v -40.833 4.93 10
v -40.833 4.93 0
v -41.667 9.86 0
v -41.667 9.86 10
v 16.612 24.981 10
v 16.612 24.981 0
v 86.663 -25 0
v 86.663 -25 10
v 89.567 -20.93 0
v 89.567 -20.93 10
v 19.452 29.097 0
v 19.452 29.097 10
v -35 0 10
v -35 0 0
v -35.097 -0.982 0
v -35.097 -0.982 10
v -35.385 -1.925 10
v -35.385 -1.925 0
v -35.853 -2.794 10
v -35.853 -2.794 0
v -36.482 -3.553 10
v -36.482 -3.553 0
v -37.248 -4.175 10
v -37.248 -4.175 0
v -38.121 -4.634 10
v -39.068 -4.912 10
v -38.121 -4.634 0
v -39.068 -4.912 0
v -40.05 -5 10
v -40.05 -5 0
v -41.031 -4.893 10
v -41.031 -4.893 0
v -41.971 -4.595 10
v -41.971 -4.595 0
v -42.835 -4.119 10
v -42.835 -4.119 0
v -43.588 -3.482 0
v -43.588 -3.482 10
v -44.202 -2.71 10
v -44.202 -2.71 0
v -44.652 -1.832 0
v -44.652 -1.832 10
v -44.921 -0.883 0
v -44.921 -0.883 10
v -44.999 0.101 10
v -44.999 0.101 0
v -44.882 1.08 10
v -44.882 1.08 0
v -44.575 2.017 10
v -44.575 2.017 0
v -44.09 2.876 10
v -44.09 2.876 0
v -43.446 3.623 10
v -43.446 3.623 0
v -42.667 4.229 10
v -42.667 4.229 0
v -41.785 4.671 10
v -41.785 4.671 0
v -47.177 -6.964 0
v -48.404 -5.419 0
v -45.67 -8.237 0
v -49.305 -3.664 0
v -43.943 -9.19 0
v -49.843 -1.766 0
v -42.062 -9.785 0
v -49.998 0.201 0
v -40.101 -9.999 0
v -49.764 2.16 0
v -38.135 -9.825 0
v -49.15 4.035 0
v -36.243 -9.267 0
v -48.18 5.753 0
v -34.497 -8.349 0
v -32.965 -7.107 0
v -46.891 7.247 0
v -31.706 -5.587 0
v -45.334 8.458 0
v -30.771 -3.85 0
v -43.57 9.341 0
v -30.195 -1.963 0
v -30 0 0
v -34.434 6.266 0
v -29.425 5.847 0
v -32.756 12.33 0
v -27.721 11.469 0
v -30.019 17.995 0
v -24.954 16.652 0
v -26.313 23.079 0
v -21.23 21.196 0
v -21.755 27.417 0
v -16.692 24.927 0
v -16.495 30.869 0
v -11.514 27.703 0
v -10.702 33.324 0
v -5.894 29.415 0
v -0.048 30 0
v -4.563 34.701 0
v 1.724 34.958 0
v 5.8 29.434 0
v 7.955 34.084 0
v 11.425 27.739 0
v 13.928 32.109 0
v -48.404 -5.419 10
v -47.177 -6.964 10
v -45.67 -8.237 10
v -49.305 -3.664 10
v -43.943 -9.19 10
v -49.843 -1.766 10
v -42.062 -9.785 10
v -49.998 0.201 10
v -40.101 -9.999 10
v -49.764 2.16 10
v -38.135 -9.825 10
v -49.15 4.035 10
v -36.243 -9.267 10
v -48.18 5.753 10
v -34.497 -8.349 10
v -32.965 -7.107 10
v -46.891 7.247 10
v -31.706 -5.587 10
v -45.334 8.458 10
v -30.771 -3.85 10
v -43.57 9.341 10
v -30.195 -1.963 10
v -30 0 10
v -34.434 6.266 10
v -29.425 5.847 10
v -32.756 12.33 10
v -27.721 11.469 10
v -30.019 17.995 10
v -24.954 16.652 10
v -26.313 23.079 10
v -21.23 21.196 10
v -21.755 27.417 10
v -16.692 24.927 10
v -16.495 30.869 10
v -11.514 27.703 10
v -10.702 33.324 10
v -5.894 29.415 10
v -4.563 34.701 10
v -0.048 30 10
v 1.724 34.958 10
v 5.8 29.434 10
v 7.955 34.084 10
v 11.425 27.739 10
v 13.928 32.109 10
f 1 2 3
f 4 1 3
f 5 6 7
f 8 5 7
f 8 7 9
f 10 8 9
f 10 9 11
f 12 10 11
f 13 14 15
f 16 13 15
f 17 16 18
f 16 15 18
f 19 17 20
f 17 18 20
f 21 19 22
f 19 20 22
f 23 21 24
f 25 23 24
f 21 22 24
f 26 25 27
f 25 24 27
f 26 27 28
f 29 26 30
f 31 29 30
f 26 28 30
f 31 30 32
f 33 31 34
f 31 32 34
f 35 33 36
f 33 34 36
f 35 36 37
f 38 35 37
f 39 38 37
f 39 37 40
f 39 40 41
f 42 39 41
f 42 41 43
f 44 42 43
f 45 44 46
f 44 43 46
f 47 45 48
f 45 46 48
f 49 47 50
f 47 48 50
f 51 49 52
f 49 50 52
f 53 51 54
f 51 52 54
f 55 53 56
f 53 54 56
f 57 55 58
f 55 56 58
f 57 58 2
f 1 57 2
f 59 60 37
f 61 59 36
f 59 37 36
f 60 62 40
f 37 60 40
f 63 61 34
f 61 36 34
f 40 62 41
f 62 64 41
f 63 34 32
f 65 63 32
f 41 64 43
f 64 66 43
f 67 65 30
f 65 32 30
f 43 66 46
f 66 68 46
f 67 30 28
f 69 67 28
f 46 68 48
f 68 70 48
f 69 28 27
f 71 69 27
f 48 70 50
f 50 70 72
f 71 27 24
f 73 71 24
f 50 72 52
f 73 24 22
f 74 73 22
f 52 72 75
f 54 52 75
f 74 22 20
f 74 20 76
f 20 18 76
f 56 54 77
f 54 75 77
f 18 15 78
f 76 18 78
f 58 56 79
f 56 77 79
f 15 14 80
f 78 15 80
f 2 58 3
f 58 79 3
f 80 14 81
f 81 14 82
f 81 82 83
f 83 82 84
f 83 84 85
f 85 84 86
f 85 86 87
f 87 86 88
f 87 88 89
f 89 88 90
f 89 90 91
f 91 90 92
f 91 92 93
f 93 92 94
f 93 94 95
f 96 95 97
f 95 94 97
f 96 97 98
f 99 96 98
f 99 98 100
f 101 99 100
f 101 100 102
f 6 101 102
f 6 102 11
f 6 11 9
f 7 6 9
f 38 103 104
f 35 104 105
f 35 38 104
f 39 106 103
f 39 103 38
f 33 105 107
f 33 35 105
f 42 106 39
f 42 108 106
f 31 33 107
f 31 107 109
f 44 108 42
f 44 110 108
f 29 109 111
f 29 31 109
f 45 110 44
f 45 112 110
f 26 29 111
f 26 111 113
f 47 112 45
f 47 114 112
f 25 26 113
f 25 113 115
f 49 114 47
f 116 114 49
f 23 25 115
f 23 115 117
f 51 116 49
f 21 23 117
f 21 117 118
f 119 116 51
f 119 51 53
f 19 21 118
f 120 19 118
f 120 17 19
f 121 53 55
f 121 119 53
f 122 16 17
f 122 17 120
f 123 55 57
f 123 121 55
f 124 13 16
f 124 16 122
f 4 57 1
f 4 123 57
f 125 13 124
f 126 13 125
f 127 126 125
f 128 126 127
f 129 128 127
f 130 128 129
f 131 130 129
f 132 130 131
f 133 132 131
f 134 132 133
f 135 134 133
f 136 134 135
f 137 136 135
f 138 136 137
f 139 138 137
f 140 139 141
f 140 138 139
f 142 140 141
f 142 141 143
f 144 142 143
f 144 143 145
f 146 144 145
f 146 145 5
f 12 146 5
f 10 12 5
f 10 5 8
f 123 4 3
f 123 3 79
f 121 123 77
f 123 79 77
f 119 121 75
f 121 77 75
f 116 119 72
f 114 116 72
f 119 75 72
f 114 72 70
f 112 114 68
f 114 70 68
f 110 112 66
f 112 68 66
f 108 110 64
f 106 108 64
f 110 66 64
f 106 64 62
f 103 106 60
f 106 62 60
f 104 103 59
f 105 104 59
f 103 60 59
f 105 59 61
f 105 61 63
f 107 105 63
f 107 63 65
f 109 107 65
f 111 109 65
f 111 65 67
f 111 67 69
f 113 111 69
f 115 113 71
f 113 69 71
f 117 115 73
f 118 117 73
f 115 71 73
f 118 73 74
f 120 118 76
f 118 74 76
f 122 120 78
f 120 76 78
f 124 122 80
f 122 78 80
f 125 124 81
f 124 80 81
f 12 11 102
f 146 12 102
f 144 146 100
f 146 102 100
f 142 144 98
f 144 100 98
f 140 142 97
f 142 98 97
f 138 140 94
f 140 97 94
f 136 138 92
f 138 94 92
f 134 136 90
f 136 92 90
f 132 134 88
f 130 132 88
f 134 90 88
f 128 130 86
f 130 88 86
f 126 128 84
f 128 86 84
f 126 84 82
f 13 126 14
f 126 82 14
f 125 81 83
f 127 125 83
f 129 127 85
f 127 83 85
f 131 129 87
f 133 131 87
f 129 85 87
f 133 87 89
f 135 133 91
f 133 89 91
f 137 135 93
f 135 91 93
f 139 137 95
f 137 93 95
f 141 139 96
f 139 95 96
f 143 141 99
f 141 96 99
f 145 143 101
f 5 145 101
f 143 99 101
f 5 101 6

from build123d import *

# Parameters (mm, degrees)
BASE_EXTRUDE_DEPTH = 10


with BuildPart() as part:
    # Sketch1 → Base-Extrude (new body)
    with BuildSketch(Plane.XY):
        with BuildLine():
            Line((89.567268983, -20.929801144), (19.452075124, 29.096679766))
            ThreePointArc((19.452075124, 29.096679766), (-16.495110953, 30.869261648), (-35, 0))
            ThreePointArc((-35, 0), (-43.227486122, -3.818813079), (-40.833333333, 4.930066486))
            Line((-40.833333333, 4.930066486), (-41.666666667, 9.860132972))
            ThreePointArc((-41.666666667, 9.860132972), (-46.454972244, -7.637626158), (-30, 0))
            ThreePointArc((-30, 0), (-14.170913912, 26.442110334), (16.612346594, 24.980591279))
            Line((16.612346594, 24.980591279), (86.66322331, -25))
            Line((86.66322331, -25), (89.567268983, -20.929801144))
        make_face()
    extrude(amount=BASE_EXTRUDE_DEPTH)


solid = part.part
